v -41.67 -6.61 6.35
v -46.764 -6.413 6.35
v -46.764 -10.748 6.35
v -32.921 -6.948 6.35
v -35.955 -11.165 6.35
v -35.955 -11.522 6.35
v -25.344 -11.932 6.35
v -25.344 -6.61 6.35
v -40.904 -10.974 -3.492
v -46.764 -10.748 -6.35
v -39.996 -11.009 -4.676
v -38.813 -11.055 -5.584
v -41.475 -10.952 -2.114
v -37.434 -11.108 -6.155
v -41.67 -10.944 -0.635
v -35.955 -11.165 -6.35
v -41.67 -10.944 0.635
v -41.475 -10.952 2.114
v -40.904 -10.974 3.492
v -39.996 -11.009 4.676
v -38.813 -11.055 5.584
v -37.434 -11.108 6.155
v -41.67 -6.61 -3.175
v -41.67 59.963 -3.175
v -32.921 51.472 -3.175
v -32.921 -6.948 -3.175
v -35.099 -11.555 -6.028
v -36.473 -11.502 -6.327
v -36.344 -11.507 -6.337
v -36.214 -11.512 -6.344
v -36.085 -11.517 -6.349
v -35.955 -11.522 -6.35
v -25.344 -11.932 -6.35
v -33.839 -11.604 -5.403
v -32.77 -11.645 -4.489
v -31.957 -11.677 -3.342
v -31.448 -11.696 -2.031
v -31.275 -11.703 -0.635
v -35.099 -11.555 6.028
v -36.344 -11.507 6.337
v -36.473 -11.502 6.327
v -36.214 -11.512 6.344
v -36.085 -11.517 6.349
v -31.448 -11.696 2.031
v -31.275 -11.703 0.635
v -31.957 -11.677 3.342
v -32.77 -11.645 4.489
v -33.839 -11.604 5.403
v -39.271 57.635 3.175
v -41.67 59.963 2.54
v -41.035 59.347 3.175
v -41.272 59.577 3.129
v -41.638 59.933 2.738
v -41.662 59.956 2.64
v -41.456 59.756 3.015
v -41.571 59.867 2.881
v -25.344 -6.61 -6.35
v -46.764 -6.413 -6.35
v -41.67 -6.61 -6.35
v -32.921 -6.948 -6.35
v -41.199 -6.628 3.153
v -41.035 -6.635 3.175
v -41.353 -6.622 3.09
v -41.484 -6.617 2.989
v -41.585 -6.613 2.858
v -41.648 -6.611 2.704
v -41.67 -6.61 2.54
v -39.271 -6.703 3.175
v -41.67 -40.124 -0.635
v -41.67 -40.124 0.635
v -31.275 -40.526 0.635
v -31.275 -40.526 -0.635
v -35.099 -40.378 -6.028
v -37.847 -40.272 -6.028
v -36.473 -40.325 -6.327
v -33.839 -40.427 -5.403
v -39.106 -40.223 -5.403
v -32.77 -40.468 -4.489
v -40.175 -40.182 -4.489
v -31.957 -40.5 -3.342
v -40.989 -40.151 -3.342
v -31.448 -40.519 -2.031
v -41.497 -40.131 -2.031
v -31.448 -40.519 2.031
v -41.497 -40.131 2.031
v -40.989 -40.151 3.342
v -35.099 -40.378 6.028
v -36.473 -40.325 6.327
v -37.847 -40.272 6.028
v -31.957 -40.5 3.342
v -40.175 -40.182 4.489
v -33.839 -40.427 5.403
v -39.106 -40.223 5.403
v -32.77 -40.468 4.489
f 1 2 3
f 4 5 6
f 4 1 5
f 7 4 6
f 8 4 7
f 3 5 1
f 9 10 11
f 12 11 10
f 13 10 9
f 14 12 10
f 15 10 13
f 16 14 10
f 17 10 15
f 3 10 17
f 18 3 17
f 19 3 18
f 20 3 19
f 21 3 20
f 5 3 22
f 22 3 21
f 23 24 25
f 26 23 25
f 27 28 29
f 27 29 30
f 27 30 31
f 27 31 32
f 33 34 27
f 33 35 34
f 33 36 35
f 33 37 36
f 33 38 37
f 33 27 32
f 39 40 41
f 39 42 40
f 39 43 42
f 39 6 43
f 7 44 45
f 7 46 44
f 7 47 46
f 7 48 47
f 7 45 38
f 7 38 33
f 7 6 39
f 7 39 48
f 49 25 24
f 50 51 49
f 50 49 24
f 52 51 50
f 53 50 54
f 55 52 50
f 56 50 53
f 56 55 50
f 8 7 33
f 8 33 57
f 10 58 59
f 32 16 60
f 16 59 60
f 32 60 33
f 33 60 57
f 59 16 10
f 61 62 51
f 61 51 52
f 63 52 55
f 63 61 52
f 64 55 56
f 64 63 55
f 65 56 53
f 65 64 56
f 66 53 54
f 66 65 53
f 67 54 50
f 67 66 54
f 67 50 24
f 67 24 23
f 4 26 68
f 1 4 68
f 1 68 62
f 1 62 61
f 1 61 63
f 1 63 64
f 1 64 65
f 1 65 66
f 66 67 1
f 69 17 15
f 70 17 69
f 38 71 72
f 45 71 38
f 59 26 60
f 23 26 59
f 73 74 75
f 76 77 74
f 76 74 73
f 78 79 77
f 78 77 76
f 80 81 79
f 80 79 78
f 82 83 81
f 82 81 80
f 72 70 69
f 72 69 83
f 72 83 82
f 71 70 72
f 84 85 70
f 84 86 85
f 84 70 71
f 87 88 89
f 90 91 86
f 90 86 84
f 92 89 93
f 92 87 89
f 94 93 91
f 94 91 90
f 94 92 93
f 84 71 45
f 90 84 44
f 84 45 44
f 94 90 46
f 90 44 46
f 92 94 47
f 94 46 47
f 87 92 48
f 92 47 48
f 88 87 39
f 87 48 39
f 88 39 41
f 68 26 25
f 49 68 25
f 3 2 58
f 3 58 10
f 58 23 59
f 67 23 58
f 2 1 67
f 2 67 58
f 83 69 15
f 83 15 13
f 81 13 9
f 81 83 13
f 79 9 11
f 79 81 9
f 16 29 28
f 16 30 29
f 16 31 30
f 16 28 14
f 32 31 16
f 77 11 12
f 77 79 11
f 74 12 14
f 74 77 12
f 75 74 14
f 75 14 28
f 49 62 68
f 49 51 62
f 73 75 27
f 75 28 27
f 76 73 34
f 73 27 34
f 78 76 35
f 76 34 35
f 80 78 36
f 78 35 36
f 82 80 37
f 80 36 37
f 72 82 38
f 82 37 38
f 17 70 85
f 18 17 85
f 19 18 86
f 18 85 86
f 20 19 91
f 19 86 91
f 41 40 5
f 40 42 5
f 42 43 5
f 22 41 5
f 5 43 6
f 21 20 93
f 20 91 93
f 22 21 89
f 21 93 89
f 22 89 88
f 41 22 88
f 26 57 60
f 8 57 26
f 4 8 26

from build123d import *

# Parameters (mm, degrees)
F1_DEPTH      = 3.175
F1_DEPTH_BACK = 3.175
F2_DEPTH      = 6.35
F2_DEPTH_BACK = 6.35
F3_SIZE       = 6.34999
F4_R          = 5.715
F5_R          = 0.635


# Not quite as in the source:
# - a fillet or chamfer is up to 0.001 mm smaller than in the source, because OpenCascade refuses the exact size


with BuildPart() as f1:
    # F0 (on Top) → F1 (new body, two sides)
    with BuildSketch(Plane.XY) as f1_sk:
        Polygon((-41.6700830699, 59.9633481442), (-41.6700830699, -6.6100518558), (-32.9213373307, -6.9480776483), (-32.9213373307, 51.4719223517), align=None)
    extrude(amount=F1_DEPTH)
    extrude(f1_sk.sketch, amount=-F1_DEPTH_BACK)

    # F0 (on Top) → F2 (join, two sides)
    with BuildSketch(Plane.XY) as f2_sk:
        Polygon((-32.9213373307, -6.9480776483), (-41.6700830699, -6.6100518558), (-46.7643177352, -6.4132256179), (-46.7643177352, -10.747612454), (-41.6700830699, -10.9444386919), (-41.6700830699, -40.1244200766), (-31.2753289716, -40.5260427889), (-31.2753289716, -11.7029547691), (-25.3439064165, -11.9321274837), (-25.3439064165, -6.6100518558), align=None)
    extrude(amount=F2_DEPTH)
    extrude(f2_sk.sketch, amount=-F2_DEPTH_BACK)

    # F3 (size 6.35 in the source; OpenCascade refuses exactly that, so slightly less here)
    f3_edges = [f1.edges().sort_by_distance(p)[0] for p in [
        (-32.921337, 22.261922, 3.175),
    ]]
    chamfer(f3_edges, length=F3_SIZE)

    # F4 (call 1 of 4: OpenCascade refuses the feature's edges together)
    f4_edges = [f1.edges().sort_by_distance(p)[0] for p in [
        (-31.275329, -26.114499, 6.35),
    ]]
    fillet(f4_edges, radius=F4_R)

    # F4#2 (call 2 of 4)
    f4_2_edges = [f1.edges().sort_by_distance(p)[0] for p in [
        (-41.670083, -25.534429, 6.35),
    ]]
    fillet(f4_2_edges, radius=F4_R)

    # F4#3 (call 3 of 4)
    f4_3_edges = [f1.edges().sort_by_distance(p)[0] for p in [
        (-31.275329, -26.114499, -6.35),
    ]]
    fillet(f4_3_edges, radius=F4_R)

    # F4#4 (call 4 of 4)
    f4_4_edges = [f1.edges().sort_by_distance(p)[0] for p in [
        (-41.670083, -25.534429, -6.35),
    ]]
    fillet(f4_4_edges, radius=F4_R)

    # F5
    f5_edges = [f1.edges().sort_by_distance(p)[0] for p in [
        (-41.670083, 26.676648, 3.175),
    ]]
    fillet(f5_edges, radius=F5_R)


solid = f1.part
